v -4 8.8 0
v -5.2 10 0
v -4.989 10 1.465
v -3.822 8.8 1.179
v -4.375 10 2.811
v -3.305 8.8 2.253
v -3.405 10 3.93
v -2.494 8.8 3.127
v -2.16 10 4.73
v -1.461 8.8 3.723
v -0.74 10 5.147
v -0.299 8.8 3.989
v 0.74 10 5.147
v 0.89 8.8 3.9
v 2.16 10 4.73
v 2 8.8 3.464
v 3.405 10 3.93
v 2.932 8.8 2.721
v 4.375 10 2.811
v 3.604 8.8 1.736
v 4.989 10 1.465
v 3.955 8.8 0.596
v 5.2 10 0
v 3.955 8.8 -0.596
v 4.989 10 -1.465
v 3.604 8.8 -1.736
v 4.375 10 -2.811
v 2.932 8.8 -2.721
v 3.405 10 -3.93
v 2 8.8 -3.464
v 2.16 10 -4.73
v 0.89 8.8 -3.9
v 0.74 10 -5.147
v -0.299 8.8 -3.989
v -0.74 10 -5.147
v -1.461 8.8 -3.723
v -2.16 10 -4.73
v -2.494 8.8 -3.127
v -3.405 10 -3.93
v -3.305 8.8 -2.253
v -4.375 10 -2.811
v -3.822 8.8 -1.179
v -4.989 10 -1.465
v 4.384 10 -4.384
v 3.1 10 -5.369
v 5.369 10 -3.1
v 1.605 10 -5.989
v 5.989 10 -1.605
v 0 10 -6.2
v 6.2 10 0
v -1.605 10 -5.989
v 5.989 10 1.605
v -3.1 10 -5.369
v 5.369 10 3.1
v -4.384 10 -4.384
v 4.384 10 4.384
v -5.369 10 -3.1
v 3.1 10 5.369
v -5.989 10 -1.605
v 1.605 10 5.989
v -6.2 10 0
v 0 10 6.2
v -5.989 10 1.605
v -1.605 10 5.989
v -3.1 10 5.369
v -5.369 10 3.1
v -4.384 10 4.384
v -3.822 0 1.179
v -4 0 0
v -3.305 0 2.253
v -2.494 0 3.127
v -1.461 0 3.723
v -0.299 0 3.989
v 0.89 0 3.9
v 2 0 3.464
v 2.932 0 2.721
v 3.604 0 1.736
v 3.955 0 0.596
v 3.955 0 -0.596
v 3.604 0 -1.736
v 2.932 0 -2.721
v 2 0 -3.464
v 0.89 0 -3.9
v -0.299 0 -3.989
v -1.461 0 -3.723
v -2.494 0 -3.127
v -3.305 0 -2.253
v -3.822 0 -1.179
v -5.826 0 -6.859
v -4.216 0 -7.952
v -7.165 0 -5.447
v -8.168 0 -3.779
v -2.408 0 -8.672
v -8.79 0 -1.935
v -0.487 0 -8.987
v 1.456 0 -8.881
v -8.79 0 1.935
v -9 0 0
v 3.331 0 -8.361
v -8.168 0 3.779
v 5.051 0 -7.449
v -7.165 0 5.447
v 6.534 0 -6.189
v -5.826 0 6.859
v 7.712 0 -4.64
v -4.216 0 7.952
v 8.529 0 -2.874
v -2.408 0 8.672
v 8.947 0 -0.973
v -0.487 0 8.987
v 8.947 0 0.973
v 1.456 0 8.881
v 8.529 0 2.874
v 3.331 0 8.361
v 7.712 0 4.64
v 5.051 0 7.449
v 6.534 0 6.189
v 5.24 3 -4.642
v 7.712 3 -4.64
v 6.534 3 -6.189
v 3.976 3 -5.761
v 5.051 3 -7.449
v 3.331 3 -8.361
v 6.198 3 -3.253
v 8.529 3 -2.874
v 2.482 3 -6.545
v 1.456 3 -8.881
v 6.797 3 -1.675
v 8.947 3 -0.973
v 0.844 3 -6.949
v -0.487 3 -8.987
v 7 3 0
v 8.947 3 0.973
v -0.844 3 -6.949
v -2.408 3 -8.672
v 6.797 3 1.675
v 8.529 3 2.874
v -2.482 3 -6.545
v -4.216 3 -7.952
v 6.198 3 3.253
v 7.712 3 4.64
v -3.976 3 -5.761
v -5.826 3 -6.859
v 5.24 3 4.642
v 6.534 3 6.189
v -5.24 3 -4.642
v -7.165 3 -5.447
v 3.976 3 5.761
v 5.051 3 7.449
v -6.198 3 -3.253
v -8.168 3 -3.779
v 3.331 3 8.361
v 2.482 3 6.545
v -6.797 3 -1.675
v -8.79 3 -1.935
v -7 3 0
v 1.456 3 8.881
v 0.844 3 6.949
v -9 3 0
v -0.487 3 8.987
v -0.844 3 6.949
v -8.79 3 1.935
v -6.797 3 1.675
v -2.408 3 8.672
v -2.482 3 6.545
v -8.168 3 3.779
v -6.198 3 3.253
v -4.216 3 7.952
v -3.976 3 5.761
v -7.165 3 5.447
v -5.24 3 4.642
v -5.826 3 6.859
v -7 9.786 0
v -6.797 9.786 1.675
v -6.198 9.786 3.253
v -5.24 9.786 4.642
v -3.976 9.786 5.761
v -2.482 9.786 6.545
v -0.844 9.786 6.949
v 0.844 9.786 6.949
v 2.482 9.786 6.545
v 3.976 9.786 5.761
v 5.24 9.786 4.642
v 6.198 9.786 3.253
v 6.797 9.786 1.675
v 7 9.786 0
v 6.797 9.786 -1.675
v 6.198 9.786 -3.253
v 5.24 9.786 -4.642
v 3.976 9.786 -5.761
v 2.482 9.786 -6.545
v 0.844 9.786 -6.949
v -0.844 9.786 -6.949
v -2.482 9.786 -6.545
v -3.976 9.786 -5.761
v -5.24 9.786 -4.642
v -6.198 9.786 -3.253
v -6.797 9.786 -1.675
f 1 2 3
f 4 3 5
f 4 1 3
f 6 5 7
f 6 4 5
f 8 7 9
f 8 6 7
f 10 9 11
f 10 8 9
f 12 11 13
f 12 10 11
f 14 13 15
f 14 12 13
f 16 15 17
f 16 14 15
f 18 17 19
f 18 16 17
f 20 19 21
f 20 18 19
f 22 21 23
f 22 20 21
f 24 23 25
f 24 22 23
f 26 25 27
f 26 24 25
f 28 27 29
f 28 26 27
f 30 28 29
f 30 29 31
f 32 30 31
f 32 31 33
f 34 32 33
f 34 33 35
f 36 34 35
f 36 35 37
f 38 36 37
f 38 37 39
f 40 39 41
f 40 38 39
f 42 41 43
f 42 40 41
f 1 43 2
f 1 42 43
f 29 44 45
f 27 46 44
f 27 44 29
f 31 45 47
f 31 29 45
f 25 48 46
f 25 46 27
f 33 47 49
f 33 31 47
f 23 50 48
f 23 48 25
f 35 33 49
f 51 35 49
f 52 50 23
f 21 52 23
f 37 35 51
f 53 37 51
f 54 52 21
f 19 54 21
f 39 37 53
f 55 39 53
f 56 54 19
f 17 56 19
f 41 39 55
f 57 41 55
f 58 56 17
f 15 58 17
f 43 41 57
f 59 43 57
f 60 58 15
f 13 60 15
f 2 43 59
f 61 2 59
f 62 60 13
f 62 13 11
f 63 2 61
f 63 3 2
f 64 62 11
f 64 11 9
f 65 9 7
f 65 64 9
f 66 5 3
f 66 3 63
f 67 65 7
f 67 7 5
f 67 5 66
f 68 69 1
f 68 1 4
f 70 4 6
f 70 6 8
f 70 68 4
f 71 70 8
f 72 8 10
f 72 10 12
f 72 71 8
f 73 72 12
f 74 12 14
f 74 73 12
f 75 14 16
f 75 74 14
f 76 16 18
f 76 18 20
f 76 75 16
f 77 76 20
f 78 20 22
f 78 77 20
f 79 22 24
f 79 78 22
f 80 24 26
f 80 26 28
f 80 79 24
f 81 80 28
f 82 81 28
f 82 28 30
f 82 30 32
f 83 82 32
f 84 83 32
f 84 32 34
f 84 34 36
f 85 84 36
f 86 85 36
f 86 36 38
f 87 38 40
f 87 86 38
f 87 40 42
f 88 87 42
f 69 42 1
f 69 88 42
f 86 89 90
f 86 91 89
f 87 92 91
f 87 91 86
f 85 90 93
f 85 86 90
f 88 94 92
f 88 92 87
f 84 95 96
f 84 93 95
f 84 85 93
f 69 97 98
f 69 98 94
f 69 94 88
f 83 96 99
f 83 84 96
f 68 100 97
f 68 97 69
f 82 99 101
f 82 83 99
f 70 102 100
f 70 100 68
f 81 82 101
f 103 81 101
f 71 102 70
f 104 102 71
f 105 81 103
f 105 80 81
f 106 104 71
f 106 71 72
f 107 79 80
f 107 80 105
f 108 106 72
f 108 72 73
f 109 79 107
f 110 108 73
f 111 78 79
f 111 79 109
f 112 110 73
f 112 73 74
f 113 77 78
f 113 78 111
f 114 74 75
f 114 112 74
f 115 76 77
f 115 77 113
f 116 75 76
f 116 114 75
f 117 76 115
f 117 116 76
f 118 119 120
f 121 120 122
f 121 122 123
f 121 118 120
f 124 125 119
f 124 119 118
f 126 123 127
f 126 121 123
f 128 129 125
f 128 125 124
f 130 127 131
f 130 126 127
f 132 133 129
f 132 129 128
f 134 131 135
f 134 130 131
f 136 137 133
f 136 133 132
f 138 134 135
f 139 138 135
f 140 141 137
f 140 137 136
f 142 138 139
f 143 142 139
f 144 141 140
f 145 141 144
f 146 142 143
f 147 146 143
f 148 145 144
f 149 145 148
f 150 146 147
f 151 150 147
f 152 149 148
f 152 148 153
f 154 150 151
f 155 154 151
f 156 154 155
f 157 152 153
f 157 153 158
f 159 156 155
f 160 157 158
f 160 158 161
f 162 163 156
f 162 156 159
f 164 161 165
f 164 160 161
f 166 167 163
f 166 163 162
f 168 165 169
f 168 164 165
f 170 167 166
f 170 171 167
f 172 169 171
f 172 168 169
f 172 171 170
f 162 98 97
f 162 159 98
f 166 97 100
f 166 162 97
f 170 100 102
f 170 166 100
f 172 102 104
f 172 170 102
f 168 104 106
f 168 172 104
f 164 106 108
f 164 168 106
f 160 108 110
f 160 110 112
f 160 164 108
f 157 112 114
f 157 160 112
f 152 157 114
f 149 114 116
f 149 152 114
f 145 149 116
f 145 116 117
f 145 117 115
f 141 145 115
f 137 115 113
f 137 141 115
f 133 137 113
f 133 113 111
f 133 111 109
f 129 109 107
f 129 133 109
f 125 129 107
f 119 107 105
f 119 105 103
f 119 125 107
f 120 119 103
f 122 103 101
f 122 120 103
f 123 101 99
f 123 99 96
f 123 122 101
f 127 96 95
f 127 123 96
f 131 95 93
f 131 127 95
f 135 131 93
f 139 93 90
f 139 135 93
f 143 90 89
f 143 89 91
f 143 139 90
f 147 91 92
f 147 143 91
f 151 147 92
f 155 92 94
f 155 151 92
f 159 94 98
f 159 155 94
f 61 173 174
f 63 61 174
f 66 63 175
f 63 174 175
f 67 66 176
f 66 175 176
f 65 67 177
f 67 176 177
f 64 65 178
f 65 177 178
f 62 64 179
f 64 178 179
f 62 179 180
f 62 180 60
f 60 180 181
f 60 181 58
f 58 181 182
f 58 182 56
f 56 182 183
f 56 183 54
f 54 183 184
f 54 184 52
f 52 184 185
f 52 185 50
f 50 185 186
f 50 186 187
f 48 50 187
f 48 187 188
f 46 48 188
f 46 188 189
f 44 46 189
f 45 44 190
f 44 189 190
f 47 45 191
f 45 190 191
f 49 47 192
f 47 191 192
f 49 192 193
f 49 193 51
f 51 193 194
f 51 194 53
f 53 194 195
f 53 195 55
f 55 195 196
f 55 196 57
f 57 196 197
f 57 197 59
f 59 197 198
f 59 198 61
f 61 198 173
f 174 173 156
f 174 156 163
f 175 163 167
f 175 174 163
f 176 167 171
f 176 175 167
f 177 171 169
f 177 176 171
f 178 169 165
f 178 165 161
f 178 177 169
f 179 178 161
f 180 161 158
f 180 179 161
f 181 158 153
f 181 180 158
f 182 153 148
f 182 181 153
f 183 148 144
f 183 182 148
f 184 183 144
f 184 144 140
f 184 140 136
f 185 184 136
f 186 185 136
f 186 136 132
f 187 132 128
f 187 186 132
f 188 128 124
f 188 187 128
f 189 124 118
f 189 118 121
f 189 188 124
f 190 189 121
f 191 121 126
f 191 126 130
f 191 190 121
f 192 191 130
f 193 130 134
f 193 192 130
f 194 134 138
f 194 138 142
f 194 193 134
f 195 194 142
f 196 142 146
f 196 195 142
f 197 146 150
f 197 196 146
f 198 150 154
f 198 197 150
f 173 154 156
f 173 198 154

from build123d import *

# Parameters (mm, degrees)
CHAMFER_1_SIZE  = 0.8
CHAMFER_1_SIZE2 = 0.214359354
CHAMFER_2_SIZE  = 1.2


with BuildPart() as part:
    # Эскиз3 → Повернуть1 (revolve)
    with BuildSketch(Plane.XY):
        Polygon((-4, 0), (-9, 0), (-9, 3), (-7, 3), (-7, 10), (-4, 10), align=None)
    revolve(axis=Axis((0, -11.687612648, 0), (0, 1, 0)))

    # Фаска1
    chamfer_1_edges = [part.edges().sort_by_distance(p)[0] for p in [
        (7, 10, 0),
    ]]
    chamfer_1_side = [part.faces().sort_by_distance(p)[0] for p in [
        (6.802010101, 10, 0),
    ]]
    chamfer(chamfer_1_edges, length=CHAMFER_1_SIZE, length2=CHAMFER_1_SIZE2, reference=chamfer_1_side[0])

    # Фаска2
    chamfer_2_edges = [part.edges().sort_by_distance(p)[0] for p in [
        (4, 10, 0),
    ]]
    chamfer(chamfer_2_edges, length=CHAMFER_2_SIZE)


solid = part.part
